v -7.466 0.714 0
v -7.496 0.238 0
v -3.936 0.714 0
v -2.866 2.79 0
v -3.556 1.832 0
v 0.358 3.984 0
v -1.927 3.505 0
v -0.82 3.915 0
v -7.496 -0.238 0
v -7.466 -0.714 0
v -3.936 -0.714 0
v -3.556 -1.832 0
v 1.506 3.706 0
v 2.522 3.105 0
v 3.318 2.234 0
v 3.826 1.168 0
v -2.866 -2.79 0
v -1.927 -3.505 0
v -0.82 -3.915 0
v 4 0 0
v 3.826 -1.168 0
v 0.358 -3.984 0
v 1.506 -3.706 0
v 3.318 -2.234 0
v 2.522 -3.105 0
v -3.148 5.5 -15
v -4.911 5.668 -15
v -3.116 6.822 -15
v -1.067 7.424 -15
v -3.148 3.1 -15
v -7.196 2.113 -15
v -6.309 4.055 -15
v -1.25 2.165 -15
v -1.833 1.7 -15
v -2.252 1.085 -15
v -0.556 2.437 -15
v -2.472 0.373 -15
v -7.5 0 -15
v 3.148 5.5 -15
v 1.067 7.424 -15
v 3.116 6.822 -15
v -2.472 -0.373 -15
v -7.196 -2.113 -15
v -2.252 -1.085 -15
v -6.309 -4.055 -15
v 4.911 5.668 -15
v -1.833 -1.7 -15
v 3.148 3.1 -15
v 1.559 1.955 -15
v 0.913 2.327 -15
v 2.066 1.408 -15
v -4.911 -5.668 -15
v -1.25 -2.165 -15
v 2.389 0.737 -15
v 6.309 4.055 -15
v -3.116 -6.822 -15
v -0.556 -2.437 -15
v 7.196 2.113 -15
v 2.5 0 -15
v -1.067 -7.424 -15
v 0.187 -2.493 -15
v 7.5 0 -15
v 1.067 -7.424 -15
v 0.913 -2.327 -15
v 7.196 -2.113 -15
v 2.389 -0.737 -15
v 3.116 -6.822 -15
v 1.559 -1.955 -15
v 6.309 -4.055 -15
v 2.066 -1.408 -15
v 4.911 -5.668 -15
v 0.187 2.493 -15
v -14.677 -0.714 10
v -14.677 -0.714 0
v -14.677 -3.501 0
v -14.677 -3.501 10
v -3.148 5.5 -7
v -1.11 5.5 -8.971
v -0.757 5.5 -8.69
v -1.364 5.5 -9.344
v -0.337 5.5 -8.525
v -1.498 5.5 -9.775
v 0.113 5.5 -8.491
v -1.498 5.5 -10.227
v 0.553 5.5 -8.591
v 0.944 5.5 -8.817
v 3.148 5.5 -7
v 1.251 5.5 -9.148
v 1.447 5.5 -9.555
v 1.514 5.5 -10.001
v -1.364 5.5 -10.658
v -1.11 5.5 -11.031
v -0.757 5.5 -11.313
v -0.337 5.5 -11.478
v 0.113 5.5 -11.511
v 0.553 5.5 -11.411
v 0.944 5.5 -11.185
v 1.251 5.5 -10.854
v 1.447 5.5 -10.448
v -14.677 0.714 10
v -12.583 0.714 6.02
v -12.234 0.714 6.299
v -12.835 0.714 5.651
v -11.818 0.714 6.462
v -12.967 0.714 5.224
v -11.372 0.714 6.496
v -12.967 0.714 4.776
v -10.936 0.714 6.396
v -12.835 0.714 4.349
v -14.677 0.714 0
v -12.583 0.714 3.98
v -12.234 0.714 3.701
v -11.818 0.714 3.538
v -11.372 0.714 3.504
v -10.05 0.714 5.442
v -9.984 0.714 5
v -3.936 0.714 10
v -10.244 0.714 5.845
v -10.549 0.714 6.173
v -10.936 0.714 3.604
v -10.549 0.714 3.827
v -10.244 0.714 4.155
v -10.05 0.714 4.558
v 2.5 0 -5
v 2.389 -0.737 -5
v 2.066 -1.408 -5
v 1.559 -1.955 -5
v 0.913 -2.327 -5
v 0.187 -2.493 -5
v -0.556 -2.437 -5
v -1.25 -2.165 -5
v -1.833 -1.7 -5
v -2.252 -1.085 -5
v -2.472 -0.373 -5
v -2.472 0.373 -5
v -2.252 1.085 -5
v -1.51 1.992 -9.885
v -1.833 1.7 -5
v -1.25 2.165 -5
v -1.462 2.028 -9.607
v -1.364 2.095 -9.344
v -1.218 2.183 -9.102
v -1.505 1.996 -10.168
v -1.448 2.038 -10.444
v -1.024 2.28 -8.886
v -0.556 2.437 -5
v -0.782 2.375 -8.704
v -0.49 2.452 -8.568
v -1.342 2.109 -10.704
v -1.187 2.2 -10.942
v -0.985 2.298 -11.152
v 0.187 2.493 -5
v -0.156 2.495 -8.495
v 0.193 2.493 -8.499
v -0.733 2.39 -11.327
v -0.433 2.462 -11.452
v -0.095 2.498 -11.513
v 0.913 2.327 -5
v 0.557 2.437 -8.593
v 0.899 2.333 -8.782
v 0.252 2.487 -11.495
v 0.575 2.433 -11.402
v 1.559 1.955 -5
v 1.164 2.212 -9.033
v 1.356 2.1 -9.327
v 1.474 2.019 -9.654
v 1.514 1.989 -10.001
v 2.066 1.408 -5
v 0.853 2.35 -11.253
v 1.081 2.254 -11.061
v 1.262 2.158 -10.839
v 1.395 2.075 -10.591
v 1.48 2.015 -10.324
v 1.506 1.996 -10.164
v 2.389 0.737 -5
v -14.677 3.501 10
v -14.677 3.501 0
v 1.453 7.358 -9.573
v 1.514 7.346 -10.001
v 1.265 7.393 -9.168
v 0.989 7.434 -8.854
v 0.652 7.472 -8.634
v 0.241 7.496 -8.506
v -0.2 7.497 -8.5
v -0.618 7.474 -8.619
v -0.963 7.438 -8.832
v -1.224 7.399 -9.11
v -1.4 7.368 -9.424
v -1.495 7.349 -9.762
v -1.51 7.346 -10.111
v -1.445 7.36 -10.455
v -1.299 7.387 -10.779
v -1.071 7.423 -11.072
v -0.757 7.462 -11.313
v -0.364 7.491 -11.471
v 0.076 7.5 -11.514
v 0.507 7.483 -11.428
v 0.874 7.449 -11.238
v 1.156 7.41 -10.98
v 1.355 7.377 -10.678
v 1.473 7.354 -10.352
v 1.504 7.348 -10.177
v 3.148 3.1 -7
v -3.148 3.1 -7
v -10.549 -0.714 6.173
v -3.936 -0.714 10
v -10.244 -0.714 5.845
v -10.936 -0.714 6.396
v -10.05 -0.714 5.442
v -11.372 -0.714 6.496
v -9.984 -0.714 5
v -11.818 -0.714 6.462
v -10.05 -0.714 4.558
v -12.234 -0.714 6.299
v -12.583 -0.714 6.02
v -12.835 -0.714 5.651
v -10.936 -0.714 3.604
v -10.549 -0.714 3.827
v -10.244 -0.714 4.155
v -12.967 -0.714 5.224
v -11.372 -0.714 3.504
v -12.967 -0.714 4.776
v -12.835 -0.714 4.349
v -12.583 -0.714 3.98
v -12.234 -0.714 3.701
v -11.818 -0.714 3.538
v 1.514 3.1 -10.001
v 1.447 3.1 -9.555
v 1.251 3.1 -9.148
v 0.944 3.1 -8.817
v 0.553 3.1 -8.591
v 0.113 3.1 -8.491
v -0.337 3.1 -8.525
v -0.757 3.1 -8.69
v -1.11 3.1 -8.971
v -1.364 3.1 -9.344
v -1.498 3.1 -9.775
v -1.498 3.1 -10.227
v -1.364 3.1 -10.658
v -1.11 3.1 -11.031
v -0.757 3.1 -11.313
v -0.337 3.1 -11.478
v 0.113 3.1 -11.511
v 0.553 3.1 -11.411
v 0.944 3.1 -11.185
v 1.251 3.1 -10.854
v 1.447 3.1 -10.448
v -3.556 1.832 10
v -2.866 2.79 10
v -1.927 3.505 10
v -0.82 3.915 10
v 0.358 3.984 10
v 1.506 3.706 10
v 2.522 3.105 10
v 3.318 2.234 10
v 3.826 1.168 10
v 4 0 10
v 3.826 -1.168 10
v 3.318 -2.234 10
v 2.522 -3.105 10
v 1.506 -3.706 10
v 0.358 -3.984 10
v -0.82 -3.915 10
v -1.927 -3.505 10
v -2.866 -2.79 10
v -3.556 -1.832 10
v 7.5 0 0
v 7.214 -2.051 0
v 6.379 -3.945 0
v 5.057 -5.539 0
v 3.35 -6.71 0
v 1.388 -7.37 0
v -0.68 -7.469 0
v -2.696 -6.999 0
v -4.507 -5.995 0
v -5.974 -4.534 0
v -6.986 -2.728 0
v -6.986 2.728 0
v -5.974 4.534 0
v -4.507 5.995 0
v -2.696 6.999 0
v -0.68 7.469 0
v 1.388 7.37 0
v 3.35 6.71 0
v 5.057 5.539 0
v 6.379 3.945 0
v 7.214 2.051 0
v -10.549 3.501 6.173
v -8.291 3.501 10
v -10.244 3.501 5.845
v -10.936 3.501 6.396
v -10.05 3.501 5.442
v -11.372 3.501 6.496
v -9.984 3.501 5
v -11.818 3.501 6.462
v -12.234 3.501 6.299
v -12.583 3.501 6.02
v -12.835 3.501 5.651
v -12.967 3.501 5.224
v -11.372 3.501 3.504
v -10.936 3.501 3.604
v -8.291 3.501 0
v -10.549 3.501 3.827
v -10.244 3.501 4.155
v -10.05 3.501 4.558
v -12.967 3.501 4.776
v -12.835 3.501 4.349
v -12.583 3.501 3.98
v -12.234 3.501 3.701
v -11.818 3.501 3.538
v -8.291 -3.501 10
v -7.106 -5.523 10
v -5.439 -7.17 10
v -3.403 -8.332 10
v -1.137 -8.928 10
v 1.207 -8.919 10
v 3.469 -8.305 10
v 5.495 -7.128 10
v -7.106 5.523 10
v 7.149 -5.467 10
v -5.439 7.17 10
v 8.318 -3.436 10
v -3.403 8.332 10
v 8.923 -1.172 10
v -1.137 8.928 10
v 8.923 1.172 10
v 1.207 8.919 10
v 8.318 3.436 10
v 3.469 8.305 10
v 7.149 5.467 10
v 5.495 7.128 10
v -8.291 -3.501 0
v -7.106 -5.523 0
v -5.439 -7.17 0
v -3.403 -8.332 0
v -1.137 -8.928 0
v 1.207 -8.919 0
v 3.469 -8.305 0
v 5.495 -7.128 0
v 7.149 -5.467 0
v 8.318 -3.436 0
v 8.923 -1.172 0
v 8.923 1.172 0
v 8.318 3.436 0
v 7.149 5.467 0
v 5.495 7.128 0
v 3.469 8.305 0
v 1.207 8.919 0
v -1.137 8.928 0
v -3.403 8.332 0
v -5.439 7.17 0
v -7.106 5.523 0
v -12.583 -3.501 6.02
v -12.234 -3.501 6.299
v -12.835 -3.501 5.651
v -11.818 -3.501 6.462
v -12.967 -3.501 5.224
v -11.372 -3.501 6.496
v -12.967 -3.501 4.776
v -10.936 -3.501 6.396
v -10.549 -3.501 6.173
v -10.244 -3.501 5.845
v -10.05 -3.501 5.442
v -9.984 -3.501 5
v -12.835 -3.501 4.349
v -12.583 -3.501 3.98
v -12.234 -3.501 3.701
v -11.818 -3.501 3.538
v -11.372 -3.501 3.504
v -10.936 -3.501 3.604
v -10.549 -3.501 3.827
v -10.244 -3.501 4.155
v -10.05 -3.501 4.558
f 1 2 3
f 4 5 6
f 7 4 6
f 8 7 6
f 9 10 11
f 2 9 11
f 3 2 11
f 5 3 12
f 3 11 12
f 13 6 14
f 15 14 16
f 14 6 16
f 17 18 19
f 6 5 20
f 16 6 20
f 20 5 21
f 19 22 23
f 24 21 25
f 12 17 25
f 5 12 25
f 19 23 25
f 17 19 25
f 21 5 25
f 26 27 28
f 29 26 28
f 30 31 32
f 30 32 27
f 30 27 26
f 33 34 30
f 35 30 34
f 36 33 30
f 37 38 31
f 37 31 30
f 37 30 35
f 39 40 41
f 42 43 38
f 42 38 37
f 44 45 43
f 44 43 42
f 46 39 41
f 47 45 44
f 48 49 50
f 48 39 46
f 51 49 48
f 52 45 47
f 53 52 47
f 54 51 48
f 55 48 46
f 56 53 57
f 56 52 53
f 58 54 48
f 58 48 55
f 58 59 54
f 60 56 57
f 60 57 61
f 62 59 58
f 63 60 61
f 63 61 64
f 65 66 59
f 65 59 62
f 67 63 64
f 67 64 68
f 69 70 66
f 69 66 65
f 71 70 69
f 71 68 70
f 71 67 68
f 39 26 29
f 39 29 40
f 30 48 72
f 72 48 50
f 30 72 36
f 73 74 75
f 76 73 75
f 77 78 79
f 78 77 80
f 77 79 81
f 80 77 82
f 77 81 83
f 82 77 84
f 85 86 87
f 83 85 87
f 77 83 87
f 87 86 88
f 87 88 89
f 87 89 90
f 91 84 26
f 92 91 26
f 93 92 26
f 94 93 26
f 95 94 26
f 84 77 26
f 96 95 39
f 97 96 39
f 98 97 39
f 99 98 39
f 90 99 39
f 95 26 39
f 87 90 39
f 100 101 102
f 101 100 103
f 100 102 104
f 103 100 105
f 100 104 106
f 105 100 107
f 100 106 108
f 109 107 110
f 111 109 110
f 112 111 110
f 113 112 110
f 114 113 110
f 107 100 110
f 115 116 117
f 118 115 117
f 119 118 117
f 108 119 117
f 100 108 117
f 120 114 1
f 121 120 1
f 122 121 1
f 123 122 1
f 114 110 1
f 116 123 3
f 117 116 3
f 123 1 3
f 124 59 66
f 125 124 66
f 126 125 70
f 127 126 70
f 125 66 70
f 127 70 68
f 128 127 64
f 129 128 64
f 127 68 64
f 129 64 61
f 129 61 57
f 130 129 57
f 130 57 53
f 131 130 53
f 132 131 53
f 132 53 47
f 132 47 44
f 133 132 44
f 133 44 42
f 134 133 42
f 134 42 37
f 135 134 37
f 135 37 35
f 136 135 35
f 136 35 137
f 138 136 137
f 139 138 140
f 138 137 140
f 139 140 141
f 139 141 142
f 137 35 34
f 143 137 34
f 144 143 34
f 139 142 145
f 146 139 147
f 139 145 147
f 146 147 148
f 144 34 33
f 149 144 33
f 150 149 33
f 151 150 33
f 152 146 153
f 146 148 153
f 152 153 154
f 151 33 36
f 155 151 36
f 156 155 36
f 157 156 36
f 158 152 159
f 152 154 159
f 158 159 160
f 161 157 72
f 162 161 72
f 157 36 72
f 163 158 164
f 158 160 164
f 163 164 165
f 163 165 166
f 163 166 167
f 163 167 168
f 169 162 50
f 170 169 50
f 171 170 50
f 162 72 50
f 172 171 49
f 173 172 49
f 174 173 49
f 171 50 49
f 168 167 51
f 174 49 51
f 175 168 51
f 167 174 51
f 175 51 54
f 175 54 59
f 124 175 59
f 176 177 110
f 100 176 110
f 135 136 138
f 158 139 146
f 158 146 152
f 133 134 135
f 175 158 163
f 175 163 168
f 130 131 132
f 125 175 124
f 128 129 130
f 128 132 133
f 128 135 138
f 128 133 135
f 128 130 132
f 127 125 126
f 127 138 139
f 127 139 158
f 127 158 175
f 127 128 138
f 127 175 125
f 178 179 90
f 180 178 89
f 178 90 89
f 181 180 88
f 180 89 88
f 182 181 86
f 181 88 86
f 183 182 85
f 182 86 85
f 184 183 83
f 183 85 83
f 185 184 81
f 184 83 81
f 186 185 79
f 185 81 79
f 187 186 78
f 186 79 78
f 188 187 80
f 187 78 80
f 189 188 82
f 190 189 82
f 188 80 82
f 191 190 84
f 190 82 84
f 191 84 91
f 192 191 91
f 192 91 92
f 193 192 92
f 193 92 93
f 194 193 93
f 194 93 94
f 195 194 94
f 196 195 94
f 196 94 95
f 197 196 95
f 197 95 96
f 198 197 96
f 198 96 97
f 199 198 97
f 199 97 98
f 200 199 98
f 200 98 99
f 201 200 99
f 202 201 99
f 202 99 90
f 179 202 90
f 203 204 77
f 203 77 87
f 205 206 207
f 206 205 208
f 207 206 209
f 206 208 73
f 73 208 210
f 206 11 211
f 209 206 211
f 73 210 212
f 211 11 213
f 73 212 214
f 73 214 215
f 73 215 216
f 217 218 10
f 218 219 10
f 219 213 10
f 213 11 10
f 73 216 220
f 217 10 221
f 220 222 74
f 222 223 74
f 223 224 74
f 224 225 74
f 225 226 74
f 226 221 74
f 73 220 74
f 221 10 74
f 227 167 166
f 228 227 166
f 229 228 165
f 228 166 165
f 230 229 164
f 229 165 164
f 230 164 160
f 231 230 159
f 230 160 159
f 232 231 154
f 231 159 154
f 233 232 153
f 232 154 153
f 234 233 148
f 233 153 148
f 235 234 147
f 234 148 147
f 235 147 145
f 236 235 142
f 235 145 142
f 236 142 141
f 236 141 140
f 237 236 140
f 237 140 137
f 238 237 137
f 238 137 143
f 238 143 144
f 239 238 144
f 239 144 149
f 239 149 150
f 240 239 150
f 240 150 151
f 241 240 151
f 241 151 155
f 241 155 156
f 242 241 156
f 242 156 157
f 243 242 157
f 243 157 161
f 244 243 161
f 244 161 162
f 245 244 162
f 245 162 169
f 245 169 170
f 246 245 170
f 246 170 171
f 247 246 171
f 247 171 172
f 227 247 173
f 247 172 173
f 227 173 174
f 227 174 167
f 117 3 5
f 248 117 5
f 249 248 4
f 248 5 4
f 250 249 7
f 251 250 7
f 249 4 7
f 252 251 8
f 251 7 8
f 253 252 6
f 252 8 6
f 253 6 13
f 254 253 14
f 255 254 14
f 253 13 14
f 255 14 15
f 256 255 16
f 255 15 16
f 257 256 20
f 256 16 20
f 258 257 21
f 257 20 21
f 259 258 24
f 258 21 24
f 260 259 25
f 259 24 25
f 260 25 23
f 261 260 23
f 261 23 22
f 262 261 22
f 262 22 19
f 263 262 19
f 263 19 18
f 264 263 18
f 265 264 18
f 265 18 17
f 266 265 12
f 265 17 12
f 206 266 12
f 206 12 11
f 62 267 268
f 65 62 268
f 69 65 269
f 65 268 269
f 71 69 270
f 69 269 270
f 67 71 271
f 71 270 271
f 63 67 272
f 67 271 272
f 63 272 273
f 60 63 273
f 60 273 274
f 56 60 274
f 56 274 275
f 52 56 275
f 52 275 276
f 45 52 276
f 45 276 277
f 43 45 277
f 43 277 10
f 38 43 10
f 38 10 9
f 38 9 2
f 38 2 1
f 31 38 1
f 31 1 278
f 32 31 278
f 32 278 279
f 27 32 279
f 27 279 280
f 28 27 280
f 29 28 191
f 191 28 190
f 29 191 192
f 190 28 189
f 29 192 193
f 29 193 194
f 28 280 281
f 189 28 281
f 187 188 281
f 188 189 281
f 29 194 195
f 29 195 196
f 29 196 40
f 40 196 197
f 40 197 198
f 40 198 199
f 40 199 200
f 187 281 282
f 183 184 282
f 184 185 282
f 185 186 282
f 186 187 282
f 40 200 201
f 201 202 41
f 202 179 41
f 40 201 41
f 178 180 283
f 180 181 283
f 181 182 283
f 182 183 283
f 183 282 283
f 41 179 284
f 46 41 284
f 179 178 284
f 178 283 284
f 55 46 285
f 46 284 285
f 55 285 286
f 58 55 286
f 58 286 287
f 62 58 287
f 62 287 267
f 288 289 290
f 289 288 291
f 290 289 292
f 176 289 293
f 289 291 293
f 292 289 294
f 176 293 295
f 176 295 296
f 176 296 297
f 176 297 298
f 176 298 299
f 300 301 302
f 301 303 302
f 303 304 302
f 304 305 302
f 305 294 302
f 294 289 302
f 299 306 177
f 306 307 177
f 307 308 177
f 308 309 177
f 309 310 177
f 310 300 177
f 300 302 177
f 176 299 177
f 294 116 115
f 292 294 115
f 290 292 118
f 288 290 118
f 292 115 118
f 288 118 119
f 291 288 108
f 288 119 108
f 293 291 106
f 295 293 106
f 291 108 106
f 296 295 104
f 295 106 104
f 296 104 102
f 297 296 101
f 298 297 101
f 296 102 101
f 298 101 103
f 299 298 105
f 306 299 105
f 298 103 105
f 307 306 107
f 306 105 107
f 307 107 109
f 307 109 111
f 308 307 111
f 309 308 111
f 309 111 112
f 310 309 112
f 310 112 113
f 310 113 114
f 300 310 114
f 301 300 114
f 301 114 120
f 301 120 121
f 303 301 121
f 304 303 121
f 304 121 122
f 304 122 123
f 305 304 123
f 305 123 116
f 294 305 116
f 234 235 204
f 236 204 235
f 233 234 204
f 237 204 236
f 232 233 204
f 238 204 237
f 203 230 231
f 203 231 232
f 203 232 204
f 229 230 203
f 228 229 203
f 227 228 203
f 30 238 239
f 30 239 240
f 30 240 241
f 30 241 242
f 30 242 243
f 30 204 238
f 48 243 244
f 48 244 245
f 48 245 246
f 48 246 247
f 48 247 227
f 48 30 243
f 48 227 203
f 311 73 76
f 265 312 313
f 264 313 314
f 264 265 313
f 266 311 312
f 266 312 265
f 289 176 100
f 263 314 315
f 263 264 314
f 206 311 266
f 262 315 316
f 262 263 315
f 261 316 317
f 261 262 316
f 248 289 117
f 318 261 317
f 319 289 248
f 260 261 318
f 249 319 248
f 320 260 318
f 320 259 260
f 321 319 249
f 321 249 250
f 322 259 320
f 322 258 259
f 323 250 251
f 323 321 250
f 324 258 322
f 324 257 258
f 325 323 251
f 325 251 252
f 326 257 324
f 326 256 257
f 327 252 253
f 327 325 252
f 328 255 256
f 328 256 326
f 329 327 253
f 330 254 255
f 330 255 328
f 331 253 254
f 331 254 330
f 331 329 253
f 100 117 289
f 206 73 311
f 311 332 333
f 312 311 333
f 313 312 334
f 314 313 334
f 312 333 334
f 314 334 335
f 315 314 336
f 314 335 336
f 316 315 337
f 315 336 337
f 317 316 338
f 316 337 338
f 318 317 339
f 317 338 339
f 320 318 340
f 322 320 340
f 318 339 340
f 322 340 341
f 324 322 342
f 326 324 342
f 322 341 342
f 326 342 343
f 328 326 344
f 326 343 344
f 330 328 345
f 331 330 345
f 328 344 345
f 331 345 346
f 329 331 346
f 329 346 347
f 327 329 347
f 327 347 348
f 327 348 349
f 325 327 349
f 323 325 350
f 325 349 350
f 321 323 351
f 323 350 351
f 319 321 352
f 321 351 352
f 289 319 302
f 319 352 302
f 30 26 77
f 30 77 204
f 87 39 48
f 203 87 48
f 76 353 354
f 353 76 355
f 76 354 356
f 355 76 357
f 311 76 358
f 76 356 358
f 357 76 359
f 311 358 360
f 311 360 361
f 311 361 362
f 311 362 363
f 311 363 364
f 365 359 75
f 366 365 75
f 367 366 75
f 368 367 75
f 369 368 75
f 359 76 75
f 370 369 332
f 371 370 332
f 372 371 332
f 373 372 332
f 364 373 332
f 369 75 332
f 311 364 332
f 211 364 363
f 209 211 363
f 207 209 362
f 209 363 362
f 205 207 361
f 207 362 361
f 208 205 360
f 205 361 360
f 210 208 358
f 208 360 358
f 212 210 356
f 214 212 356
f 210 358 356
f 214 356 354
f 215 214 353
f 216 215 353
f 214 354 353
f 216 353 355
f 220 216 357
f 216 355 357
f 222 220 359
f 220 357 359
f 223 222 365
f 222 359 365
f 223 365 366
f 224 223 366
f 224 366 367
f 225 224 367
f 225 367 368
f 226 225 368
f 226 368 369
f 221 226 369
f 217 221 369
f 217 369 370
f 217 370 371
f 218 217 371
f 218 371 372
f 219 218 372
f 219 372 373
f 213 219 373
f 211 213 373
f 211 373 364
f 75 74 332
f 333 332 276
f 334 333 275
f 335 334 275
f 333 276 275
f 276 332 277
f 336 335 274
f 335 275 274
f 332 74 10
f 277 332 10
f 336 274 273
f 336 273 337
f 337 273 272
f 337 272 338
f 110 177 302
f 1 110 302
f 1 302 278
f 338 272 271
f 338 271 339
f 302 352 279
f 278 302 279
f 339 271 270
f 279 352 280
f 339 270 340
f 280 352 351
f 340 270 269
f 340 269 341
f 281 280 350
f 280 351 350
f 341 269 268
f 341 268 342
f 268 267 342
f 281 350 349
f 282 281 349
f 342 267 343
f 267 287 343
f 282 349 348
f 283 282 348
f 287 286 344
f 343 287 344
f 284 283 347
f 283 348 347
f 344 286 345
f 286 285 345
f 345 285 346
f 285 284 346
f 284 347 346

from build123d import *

# Parameters (mm, degrees)
F1_DEPTH  = 10
F2_R      = 7.5
F3_DEPTH  = 15
F4_R      = 2.5
F5_DEPTH  = 10
F6_R      = 1.5
F7_DEPTH  = 25
F8_R      = 1.514445
F9_DEPTH  = 25
F10_W     = 6.295164
F10_H     = 2.4
F11_DEPTH = 8


with BuildPart() as f1:
    # F0 (on Top) → F1 (new body)
    with BuildSketch(Plane.XY):
        with BuildLine():
            Line((-14.676502, -3.500946), (-8.291163, -3.500946))
            ThreePointArc((-8.291163, -3.500946), (9, 0), (-8.291163, 3.500946))
            Line((-8.291163, 3.500946), (-14.676502, 3.500946))
            Line((-14.676502, 3.500946), (-14.676502, 0.713968))
            Line((-14.676502, 0.713968), (-3.935766, 0.713968))
            ThreePointArc((-3.935766, 0.713968), (4, 0), (-3.935766, -0.713968))
            Line((-3.935766, -0.713968), (-14.676502, -0.713968))
            Line((-14.676502, -0.713968), (-14.676502, -3.500946))
        make_face()
    extrude(amount=F1_DEPTH)

    # F2 (on face) → F3 (join)
    with BuildSketch(Plane(origin=(0, 0, 0), x_dir=(1, 0, 0), z_dir=(0, 0, -1))):
        Circle(F2_R)
    extrude(amount=F3_DEPTH)

    # F4 (on face) → F5 (cut)
    with BuildSketch(Plane(origin=(0, 0, -15), x_dir=(1, 0, 0), z_dir=(0, 0, -1))):
        Circle(F4_R)
    extrude(amount=-F5_DEPTH, mode=Mode.SUBTRACT)

    # F6 (on face) → F7 (cut)
    with BuildSketch(Plane.XZ.offset(3.500946)):
        with Locations((-11.483832, 5)):
            Circle(F6_R)
    extrude(amount=-F7_DEPTH, mode=Mode.SUBTRACT)

    # F8 (on Front) → F9 (cut)
    with BuildSketch(Plane.XZ):
        with Locations((0, -10.001184)):
            Circle(F8_R)
    extrude(amount=-F9_DEPTH, mode=Mode.SUBTRACT)

    # F10 (on face) → F11 (cut)
    with BuildSketch(Plane(origin=(0, 0, -15), x_dir=(1, 0, 0), z_dir=(0, 0, -1))):
        with Locations((0, -4.299535)):
            Rectangle(F10_W, F10_H)
    extrude(amount=-F11_DEPTH, mode=Mode.SUBTRACT)


solid = f1.part
